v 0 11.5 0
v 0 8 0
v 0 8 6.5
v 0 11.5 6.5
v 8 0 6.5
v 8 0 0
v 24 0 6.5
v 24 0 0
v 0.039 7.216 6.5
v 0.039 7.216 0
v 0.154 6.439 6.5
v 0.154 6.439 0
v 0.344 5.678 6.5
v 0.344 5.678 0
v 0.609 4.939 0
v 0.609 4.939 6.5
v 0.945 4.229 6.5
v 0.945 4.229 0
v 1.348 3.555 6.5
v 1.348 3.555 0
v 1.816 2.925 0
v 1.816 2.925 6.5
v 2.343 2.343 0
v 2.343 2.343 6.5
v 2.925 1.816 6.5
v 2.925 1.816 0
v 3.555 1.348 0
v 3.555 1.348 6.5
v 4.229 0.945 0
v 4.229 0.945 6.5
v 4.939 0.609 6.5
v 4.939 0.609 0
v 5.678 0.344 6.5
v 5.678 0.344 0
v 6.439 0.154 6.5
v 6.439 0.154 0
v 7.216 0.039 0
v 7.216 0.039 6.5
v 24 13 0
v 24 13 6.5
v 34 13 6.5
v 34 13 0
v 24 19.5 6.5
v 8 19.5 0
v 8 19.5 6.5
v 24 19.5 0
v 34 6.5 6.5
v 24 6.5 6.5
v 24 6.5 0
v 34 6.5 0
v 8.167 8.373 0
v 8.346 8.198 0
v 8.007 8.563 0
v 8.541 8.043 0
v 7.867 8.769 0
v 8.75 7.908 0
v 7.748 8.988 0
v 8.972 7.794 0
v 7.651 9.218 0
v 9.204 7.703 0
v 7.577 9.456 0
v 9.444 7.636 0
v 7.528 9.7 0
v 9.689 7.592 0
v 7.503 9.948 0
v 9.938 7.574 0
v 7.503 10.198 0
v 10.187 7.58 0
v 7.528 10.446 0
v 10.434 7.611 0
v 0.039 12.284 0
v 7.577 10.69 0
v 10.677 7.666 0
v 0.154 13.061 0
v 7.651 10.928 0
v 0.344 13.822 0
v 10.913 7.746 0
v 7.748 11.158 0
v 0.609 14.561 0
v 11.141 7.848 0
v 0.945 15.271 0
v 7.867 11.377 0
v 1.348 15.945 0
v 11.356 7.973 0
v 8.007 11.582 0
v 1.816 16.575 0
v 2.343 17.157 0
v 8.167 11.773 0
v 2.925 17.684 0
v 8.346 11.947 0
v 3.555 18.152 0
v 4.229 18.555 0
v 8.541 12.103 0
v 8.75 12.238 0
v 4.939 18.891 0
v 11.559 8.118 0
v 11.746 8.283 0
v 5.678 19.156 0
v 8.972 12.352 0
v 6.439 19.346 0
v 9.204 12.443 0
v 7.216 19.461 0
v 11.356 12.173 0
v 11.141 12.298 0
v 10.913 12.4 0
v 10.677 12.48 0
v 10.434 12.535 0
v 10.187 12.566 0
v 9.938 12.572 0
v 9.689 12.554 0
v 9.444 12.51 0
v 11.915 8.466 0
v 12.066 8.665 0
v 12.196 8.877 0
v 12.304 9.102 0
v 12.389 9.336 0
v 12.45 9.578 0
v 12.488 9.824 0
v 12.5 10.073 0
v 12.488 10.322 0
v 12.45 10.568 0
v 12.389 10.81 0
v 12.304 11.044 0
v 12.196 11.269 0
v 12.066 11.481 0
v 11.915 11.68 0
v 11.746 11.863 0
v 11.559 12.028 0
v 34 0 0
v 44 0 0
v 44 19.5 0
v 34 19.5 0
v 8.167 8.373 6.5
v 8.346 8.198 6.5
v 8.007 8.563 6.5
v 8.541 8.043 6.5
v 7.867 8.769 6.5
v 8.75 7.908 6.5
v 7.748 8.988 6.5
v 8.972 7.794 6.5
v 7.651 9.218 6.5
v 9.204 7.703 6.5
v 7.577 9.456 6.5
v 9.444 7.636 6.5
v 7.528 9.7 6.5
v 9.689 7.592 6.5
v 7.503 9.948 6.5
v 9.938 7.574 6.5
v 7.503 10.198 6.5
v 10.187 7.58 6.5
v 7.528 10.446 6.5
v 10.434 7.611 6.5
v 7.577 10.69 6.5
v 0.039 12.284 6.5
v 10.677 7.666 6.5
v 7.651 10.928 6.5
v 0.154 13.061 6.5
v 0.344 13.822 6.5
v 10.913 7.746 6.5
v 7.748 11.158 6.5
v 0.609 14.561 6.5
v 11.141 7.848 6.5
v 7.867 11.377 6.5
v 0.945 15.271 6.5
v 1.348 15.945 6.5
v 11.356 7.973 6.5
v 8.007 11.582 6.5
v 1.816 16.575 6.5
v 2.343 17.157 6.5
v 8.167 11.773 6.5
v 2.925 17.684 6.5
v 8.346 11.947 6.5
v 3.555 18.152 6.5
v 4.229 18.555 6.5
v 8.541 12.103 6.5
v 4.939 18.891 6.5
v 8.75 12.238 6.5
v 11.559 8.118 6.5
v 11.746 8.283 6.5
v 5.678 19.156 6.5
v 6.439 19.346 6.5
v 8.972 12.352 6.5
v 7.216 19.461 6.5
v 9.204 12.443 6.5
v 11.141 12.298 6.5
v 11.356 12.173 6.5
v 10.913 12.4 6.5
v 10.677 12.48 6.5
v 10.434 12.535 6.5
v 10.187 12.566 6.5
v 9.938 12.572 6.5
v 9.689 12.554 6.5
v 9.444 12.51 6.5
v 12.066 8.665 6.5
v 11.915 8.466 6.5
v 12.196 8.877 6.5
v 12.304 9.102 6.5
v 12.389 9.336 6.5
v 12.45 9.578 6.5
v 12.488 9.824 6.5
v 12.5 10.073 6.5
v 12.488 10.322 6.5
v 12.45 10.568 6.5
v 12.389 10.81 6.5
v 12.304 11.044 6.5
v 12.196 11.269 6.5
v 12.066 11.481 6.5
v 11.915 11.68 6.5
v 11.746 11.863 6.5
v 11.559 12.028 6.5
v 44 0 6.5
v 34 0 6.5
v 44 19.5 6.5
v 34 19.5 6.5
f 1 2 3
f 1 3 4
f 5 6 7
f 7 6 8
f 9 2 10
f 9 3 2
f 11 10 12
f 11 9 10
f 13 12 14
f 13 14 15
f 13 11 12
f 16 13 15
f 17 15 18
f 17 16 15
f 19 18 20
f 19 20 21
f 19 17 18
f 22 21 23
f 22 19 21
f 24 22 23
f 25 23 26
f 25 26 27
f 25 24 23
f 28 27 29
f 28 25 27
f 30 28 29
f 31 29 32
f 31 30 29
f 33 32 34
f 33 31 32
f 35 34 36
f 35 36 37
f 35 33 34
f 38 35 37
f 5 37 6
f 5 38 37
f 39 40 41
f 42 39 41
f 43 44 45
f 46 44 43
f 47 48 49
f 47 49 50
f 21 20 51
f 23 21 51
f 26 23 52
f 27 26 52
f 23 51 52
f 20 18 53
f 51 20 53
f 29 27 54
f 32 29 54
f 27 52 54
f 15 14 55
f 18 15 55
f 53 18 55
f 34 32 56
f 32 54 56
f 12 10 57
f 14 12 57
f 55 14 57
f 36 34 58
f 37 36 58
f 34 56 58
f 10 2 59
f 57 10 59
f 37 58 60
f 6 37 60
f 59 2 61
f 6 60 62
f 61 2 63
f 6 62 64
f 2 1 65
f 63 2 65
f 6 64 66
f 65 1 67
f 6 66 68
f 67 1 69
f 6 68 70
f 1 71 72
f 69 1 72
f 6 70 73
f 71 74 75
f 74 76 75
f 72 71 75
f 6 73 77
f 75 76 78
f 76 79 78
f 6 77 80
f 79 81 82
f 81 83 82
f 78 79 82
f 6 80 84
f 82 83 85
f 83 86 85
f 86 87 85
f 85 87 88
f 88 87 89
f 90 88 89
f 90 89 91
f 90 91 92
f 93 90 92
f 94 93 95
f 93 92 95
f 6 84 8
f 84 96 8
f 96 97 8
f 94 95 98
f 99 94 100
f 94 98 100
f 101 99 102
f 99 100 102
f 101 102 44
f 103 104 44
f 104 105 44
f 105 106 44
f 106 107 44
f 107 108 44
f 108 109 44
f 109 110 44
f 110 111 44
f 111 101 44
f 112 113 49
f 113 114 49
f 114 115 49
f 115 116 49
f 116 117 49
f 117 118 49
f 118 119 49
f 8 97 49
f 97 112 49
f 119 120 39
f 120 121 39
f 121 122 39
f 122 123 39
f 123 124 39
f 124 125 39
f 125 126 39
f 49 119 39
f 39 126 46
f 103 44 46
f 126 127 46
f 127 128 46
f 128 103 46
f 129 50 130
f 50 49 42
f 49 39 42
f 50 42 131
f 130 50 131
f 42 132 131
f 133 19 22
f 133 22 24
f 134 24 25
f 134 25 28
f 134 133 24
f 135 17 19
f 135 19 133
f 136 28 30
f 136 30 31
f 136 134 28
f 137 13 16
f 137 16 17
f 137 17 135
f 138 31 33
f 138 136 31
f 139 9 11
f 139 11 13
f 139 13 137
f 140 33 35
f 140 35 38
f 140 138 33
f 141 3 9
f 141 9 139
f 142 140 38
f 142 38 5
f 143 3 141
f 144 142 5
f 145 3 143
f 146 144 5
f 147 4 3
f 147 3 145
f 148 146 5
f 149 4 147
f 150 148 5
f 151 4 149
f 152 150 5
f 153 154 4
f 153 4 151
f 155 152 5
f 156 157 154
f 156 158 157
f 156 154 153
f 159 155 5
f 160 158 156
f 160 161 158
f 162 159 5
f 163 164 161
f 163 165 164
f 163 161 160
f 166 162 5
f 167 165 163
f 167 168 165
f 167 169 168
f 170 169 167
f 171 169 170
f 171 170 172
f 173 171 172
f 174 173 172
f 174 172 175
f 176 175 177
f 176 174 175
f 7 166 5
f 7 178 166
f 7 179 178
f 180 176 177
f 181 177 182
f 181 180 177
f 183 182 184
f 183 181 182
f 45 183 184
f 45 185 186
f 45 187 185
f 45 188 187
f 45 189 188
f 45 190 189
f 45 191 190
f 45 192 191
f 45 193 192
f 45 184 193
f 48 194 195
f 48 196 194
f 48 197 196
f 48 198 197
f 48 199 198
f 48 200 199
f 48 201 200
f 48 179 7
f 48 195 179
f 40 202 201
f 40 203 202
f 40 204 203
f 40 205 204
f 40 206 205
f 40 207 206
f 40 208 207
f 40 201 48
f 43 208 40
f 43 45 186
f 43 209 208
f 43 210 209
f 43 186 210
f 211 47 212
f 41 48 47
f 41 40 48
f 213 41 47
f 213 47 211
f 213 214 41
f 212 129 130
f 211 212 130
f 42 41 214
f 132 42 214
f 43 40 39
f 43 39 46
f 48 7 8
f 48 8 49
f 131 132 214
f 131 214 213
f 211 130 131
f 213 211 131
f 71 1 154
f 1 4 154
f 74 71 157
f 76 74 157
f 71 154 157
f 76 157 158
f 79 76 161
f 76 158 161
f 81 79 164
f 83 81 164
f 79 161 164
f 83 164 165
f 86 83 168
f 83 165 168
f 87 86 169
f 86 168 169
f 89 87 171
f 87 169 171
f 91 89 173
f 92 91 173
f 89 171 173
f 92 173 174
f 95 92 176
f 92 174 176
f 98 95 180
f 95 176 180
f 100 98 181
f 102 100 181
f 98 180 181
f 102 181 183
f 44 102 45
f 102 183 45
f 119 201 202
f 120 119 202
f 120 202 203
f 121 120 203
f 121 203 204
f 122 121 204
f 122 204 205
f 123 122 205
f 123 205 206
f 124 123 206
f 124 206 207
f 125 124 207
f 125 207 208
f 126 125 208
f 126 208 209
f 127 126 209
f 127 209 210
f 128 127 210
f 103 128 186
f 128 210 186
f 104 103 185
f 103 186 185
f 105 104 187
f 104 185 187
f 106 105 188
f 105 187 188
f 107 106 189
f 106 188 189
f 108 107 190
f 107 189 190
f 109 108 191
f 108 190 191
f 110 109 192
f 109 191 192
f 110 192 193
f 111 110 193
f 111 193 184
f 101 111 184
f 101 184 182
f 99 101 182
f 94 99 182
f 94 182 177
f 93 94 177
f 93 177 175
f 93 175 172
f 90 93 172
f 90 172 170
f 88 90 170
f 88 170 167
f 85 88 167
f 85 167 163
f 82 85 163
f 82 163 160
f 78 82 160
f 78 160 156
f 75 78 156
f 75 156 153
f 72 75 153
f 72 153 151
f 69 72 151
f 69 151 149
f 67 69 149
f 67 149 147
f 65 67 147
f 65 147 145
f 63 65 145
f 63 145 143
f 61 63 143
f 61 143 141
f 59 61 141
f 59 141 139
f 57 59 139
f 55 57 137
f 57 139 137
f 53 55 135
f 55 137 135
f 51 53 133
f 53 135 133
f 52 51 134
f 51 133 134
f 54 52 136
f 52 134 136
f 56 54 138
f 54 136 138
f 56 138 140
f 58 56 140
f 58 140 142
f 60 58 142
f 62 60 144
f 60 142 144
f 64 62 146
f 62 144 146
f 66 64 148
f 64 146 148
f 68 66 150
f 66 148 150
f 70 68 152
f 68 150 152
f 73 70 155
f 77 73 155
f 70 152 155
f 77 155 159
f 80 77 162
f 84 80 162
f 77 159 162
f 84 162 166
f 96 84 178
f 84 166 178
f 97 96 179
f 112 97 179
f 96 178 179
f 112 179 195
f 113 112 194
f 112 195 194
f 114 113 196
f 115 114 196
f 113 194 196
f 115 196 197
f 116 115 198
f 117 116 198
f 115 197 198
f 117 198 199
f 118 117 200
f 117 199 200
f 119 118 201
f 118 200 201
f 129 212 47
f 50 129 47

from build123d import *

# Parameters (mm, degrees)
SKETCH1_W           = 44
SKETCH1_H           = 19.5
BOSS_EXTRUDE1_DEPTH = 6.5
CUT_EXTRUDE1_REACH  = 50.564
SKETCH2_W           = 10
SKETCH2_H           = 6.5
FILLET1_R           = 8
CUT_EXTRUDE2_REACH  = 50.564
SKETCH3_R           = 2.5


with BuildPart() as part:
    # Sketch1 → Boss-Extrude1 (new body)
    with BuildSketch(Plane.XY):
        with Locations((22, 9.75)):
            Rectangle(SKETCH1_W, SKETCH1_H)
    extrude(amount=BOSS_EXTRUDE1_DEPTH)

    # Sketch2 → Cut-Extrude1 (cut, up to next)
    with BuildSketch(Plane.XY.offset(6.5), mode=Mode.PRIVATE) as cut_extrude1_sk1:
        with Locations((29, 16.25)):
            Rectangle(SKETCH2_W, SKETCH2_H)
    cut_extrude1_tool1 = extrude(cut_extrude1_sk1.sketch, amount=-CUT_EXTRUDE1_REACH, mode=Mode.PRIVATE) & part.part
    # Sketch2 → Cut-Extrude1 (cut, up to next)
    with BuildSketch(Plane.XY.offset(6.5), mode=Mode.PRIVATE) as cut_extrude1_sk2:
        with Locations((29, 3.25)):
            Rectangle(SKETCH2_W, SKETCH2_H)
    cut_extrude1_tool2 = extrude(cut_extrude1_sk2.sketch, amount=-CUT_EXTRUDE1_REACH, mode=Mode.PRIVATE) & part.part
    add(cut_extrude1_tool1.solids().sort_by_distance((29, 16.25, 6.5))[0], mode=Mode.SUBTRACT)
    add(cut_extrude1_tool2.solids().sort_by_distance((29, 3.25, 6.5))[0], mode=Mode.SUBTRACT)

    # Fillet1
    fillet1_edges = [part.edges().sort_by_distance(p)[0] for p in [
        (0, 19.5, 3.25),
        (0, 0, 3.25),
    ]]
    fillet(fillet1_edges, radius=FILLET1_R)

    # Sketch3 → Cut-Extrude2 (cut, up to next)
    with BuildSketch(Plane.XY.offset(6.5), mode=Mode.PRIVATE) as cut_extrude2_sk1:
        with Locations((10, 10.072944896)):
            Circle(SKETCH3_R)
    cut_extrude2_tool1 = extrude(cut_extrude2_sk1.sketch, amount=-CUT_EXTRUDE2_REACH, mode=Mode.PRIVATE) & part.part
    add(cut_extrude2_tool1.solids().sort_by_distance((10, 10.072945, 6.5))[0], mode=Mode.SUBTRACT)


solid = part.part
